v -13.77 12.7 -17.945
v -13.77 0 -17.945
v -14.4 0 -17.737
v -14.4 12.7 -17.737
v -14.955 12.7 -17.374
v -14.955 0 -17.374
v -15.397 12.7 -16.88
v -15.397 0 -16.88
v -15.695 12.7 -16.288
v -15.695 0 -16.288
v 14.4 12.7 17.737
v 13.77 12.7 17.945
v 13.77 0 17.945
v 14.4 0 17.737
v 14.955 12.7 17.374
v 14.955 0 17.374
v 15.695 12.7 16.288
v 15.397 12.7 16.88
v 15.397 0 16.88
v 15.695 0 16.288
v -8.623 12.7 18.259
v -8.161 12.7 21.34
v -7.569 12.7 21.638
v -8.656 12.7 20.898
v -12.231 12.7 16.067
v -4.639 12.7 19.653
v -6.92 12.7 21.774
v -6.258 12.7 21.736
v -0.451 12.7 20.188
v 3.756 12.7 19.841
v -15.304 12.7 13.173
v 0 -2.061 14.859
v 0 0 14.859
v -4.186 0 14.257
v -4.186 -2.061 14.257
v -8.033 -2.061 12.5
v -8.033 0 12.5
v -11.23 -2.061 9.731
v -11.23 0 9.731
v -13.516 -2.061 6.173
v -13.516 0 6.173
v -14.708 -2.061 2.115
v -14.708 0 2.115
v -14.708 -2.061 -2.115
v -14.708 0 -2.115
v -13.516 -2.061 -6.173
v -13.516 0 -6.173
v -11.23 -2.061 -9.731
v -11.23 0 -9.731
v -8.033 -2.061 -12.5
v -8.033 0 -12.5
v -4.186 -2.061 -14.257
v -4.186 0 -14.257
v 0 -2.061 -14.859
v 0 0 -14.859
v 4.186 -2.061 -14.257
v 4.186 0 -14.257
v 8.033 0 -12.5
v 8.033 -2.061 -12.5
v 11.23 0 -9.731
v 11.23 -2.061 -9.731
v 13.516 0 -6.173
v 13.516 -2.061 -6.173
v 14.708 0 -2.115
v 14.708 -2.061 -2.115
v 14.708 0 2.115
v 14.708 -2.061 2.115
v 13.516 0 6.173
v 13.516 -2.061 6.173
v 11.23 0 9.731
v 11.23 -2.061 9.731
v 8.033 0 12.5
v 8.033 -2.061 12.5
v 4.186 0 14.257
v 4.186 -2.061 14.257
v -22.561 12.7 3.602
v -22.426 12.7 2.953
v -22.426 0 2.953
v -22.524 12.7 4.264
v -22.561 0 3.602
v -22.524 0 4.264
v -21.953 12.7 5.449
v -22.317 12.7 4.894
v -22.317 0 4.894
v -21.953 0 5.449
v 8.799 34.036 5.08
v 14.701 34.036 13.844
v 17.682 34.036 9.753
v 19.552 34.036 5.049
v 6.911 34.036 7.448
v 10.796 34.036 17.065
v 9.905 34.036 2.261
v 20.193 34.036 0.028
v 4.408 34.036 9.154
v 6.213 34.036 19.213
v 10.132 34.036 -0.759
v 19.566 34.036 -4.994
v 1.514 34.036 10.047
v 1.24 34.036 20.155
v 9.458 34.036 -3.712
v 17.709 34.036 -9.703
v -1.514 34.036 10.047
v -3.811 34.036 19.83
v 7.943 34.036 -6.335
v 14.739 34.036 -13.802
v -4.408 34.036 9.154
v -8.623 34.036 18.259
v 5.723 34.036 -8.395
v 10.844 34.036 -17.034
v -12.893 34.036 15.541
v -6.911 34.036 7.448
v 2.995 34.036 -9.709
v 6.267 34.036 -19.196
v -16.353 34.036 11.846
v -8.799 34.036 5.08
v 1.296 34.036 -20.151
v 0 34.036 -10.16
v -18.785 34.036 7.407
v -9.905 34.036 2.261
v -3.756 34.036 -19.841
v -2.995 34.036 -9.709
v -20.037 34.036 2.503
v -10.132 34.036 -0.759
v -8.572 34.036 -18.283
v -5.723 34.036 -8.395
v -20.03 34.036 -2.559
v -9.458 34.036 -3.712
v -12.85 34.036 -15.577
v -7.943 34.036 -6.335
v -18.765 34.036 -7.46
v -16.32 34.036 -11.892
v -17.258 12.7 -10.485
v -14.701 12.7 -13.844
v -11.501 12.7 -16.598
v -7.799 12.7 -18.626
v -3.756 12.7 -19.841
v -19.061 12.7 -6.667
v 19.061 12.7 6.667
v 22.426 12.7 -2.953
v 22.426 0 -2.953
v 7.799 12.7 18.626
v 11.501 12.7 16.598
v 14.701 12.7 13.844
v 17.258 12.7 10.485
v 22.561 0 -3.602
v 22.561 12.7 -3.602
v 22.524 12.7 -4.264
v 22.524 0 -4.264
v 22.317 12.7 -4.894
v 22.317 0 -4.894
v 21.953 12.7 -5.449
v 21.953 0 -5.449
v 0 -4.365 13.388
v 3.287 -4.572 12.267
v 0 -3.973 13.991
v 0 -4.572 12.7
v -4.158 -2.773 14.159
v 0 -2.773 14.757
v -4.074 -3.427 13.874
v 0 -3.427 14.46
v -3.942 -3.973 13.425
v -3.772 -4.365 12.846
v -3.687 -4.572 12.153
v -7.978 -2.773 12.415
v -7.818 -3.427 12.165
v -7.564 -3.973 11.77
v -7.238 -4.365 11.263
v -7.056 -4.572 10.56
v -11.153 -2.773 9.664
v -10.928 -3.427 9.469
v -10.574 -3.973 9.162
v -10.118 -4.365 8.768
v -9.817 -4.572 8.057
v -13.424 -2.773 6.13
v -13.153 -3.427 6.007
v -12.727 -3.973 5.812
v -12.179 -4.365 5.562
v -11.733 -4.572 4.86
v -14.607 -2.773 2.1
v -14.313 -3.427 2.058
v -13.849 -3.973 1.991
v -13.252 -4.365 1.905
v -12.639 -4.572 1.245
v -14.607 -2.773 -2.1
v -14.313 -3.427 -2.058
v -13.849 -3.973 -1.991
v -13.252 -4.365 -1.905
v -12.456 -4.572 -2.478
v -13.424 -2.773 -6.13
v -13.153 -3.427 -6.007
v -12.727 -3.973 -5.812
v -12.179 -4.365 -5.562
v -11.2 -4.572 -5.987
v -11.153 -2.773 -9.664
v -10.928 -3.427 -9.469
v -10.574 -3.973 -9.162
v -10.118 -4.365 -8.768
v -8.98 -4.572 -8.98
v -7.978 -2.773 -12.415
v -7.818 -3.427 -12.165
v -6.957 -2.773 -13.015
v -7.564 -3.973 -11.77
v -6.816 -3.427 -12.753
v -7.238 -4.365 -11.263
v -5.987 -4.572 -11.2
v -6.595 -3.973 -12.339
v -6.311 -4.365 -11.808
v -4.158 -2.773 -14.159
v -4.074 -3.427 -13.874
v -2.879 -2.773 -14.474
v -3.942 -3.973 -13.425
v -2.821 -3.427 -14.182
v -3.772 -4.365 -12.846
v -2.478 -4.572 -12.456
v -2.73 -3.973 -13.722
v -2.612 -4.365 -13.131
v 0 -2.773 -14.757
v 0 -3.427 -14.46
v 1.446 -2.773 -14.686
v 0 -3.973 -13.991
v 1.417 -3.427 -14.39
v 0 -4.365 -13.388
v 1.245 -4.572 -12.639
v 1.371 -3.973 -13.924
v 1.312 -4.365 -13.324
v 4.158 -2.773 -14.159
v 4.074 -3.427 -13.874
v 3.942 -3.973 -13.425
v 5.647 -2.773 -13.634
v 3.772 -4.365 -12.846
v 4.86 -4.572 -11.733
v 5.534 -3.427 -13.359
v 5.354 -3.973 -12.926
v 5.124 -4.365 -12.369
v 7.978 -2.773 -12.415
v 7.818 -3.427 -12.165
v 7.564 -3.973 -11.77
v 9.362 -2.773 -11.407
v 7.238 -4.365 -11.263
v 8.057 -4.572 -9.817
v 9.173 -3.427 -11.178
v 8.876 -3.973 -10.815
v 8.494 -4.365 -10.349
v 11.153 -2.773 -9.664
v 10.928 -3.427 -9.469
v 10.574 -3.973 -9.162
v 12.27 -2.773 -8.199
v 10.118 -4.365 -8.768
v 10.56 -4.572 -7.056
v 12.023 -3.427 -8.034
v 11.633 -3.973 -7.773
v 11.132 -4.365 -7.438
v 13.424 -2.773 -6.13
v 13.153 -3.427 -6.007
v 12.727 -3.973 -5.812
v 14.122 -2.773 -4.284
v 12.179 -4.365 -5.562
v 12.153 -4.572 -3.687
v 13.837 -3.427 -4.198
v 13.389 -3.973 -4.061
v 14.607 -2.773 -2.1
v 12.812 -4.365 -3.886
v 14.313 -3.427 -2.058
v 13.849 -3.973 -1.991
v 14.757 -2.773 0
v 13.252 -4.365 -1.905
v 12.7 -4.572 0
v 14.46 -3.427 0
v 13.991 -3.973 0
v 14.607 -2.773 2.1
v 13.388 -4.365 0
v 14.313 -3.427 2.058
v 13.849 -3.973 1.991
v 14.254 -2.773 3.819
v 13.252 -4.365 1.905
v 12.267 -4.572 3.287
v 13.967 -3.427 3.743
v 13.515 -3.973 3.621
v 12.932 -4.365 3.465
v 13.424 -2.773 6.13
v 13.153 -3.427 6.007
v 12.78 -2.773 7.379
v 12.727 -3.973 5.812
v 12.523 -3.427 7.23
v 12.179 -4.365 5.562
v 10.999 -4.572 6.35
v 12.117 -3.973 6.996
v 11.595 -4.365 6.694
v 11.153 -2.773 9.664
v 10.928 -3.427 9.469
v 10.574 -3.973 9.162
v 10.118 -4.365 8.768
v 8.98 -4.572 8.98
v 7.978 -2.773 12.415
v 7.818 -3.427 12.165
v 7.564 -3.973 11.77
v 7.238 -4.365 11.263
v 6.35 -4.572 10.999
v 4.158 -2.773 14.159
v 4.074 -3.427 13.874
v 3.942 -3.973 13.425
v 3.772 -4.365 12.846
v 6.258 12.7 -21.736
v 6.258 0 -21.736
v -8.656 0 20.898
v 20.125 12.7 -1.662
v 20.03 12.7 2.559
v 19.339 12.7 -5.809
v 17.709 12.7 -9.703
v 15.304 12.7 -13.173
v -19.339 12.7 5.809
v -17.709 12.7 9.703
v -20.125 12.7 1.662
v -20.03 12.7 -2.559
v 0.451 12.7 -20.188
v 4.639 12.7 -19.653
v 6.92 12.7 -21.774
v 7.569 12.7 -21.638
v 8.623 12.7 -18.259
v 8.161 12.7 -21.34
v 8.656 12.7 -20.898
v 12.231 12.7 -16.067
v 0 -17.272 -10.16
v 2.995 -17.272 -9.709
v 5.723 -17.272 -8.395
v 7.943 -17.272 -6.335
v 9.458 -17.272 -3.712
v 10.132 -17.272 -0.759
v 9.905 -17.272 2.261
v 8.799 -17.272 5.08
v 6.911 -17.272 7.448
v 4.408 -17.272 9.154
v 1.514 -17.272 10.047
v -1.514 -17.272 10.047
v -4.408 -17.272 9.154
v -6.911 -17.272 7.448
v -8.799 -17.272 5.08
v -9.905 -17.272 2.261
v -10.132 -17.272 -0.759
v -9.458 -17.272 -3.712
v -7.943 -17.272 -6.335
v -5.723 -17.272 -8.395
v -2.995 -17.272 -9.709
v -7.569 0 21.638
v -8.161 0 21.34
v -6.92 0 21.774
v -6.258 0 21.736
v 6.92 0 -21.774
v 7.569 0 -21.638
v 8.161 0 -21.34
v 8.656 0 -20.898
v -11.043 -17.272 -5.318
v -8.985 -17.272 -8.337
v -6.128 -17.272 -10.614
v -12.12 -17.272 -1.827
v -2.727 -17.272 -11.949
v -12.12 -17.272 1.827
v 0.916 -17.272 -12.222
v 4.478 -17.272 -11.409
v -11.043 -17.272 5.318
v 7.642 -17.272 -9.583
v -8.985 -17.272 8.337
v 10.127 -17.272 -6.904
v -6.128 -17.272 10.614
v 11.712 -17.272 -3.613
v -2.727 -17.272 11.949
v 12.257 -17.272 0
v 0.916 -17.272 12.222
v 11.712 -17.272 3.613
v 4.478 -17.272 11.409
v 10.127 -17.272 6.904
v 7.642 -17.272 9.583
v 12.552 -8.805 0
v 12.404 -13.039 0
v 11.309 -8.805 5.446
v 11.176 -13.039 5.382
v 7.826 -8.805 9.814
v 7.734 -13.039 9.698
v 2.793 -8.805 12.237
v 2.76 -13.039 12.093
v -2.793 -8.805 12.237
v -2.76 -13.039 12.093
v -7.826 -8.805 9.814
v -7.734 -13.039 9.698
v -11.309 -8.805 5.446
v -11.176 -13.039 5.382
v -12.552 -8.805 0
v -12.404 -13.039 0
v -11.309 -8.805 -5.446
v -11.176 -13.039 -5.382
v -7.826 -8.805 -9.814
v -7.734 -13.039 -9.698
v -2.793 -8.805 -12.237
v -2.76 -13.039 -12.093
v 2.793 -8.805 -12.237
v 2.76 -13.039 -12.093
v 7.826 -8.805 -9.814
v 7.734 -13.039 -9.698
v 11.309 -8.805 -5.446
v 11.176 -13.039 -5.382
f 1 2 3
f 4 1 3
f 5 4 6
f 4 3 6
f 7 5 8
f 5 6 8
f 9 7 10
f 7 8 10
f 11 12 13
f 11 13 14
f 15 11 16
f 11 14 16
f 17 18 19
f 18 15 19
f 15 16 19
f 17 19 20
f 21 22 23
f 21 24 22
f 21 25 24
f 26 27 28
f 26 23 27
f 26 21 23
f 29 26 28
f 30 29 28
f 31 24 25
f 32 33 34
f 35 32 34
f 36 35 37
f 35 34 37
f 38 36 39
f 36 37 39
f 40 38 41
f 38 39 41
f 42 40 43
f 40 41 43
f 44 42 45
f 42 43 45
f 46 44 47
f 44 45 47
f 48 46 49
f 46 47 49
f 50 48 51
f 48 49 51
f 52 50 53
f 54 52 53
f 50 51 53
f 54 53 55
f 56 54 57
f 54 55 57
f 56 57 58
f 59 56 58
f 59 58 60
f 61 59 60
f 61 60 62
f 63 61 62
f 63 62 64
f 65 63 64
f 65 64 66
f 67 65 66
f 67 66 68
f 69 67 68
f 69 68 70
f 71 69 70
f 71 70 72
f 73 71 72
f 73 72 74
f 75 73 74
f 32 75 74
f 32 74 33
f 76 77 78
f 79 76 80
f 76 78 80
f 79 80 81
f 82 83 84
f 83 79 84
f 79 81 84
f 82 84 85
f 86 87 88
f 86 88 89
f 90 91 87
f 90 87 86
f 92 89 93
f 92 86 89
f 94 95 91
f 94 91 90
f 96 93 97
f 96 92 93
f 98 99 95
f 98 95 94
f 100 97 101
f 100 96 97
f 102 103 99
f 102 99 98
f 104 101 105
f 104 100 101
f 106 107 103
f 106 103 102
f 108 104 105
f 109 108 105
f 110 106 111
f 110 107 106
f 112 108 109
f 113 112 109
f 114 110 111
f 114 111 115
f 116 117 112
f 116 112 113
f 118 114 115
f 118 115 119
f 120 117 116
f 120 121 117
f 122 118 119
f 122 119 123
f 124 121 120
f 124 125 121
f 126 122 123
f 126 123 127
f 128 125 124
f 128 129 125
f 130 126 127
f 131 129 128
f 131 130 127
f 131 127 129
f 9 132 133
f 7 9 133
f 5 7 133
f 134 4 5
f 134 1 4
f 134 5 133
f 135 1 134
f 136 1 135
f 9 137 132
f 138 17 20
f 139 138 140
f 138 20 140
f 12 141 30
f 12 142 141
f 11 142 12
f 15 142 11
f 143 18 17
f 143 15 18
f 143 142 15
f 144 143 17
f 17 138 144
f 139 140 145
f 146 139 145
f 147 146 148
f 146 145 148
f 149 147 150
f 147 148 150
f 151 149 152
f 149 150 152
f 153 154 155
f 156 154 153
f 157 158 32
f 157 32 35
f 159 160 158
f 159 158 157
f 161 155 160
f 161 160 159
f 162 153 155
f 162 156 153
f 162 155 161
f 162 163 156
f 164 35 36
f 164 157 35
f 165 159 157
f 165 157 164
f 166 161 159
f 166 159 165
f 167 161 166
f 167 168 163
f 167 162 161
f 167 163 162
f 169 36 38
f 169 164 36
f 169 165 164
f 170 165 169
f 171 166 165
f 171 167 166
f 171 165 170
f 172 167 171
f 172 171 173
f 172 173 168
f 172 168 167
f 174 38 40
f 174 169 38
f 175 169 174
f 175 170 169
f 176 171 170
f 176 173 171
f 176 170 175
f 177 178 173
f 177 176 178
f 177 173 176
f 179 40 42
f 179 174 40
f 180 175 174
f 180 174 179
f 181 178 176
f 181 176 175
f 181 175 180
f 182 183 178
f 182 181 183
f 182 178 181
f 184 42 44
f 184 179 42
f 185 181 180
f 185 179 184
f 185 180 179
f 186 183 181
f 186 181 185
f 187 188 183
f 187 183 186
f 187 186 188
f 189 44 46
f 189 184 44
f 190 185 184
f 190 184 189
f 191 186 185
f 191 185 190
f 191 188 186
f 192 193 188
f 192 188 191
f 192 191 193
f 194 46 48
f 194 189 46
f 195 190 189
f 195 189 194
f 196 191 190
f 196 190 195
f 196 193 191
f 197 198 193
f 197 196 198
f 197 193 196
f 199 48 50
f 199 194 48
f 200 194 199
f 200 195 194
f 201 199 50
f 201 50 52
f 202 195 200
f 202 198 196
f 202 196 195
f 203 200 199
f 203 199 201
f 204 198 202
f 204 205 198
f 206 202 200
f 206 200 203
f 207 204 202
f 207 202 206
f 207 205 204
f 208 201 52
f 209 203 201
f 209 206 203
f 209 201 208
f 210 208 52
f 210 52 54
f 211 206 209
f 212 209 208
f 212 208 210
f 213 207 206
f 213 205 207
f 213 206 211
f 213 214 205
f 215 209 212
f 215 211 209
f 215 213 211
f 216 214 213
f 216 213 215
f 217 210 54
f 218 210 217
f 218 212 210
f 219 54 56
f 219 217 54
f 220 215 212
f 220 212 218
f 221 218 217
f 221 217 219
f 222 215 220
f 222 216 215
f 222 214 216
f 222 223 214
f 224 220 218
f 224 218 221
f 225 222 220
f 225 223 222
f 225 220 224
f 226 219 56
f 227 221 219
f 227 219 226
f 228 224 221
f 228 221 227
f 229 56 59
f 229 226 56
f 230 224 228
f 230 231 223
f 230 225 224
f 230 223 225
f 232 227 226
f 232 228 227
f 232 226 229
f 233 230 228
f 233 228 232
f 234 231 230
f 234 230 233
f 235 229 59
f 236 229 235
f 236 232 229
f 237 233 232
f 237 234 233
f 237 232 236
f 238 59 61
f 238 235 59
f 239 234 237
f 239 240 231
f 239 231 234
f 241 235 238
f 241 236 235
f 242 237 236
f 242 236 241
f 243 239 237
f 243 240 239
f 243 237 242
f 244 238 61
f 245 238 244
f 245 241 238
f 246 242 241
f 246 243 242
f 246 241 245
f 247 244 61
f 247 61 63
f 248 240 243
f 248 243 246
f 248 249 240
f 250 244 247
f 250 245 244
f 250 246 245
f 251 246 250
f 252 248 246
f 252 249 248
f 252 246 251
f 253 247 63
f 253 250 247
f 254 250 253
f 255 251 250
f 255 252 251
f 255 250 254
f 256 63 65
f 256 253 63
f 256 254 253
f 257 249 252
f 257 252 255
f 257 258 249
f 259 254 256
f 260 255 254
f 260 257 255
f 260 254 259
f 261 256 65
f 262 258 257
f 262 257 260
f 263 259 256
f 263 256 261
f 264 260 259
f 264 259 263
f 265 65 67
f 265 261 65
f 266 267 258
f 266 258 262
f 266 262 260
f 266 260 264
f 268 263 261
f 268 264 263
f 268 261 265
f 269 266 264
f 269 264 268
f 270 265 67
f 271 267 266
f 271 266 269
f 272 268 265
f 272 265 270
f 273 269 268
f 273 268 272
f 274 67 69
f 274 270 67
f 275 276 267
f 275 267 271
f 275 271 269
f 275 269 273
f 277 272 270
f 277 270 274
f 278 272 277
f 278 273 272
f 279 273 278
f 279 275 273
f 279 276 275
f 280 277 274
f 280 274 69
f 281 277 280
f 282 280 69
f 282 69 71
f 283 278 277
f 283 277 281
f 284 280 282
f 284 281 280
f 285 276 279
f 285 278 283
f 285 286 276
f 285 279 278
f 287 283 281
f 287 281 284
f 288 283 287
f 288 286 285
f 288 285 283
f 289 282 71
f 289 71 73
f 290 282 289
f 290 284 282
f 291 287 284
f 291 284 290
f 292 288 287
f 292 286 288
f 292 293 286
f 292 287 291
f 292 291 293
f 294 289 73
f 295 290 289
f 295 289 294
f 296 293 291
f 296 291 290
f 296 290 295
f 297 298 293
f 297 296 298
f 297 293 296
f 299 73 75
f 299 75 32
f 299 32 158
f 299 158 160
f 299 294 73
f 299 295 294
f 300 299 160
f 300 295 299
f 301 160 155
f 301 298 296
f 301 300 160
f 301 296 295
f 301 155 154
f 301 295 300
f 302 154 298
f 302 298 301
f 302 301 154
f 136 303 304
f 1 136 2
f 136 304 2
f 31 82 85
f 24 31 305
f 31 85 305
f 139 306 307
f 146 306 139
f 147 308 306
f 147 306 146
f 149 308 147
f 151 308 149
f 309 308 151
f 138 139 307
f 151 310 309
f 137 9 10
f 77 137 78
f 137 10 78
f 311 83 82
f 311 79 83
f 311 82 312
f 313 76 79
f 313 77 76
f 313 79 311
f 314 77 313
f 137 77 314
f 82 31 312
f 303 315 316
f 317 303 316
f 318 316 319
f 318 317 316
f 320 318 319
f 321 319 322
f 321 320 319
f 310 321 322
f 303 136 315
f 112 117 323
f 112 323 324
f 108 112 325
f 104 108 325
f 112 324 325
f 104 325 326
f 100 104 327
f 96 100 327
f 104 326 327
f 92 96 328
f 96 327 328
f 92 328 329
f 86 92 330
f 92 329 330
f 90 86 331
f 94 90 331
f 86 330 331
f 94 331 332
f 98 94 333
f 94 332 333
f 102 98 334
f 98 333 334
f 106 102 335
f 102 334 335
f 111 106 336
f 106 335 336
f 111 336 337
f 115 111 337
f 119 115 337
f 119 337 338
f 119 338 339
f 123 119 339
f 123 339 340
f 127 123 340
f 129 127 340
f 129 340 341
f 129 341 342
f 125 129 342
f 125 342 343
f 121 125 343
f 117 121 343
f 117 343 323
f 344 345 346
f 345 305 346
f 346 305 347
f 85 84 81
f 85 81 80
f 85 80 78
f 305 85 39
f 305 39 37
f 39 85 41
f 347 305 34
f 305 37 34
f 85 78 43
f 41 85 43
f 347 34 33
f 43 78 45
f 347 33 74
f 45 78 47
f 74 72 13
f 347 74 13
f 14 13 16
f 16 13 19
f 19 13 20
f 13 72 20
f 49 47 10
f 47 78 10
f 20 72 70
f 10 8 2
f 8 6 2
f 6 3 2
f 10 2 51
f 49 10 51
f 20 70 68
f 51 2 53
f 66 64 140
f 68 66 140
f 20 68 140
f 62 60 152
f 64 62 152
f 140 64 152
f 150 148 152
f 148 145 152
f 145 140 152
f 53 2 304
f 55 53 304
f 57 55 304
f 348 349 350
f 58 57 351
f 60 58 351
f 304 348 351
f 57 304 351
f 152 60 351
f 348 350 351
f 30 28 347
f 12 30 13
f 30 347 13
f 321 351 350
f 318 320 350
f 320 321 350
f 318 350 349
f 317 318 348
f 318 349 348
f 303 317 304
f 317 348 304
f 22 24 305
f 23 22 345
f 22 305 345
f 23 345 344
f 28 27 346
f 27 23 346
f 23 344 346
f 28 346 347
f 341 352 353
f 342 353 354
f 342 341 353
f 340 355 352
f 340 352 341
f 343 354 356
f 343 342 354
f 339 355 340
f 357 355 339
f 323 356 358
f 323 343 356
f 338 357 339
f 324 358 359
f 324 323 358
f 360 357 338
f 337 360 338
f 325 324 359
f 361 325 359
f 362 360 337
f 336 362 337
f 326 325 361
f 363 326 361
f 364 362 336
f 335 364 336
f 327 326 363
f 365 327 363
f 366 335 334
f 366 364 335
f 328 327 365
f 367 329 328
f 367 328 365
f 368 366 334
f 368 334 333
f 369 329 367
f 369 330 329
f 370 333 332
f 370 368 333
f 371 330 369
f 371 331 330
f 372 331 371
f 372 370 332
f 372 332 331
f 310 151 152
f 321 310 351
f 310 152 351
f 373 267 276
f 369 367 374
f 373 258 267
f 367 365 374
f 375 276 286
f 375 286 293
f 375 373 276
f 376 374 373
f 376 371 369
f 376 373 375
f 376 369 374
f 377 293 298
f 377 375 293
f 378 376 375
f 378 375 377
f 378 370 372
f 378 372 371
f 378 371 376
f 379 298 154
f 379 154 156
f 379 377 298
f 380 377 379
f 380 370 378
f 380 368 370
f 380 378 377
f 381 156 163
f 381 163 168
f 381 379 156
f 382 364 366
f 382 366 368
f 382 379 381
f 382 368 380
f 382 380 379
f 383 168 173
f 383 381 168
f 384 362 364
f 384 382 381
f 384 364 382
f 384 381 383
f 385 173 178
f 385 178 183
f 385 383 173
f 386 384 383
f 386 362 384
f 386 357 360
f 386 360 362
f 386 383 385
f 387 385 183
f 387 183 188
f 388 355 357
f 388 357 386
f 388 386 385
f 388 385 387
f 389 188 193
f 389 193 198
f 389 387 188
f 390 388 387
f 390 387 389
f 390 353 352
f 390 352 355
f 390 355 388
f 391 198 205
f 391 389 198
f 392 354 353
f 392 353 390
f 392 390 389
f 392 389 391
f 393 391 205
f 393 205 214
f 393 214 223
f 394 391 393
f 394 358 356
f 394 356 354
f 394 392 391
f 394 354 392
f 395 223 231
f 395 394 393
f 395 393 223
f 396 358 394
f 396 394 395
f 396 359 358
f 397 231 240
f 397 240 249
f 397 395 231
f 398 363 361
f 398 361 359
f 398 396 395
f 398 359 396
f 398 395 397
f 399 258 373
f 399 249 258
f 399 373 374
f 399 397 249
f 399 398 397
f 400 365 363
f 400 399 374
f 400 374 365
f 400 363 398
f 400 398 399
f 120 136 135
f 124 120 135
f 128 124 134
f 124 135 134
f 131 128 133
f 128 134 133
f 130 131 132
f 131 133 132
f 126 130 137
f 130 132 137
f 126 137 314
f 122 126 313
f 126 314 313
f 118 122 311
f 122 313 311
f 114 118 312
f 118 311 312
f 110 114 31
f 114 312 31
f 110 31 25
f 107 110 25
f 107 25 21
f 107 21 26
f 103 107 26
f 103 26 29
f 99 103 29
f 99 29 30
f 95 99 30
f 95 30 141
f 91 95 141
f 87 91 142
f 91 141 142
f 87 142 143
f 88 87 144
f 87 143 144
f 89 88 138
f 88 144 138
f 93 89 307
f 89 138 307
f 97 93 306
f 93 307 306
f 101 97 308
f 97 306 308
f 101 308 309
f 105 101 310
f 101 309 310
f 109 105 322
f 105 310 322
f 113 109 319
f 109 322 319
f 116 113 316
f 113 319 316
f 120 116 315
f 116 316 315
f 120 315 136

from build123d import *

# Parameters (mm, degrees)
BOSS_EXTRUDE1_DEPTH = 12.7
SKETCH2_R           = 20.193
BOSS_EXTRUDE2_DEPTH = 21.336
SKETCH3_R           = 14.859
BOSS_EXTRUDE3_DEPTH = 4.572
SKETCH4_R           = 12.7
BOSS_EXTRUDE4_DEPTH = 12.7
BOSS_EXTRUDE4_TAPER = 2
SKETCH5_R           = 10.16
CUT_EXTRUDE1_DEPTH  = 61.347161428
FILLET1_R           = 2.54


with BuildPart() as part:
    # Sketch1 → Boss-Extrude1 (new body)
    with BuildSketch(Plane(origin=(0, 0, 0), x_dir=(1, 0, 0), z_dir=(0, 1, 0))):
        Polygon((15.211069479, -17.672003206), (22.909938452, 4.337170984), (7.698868973, 22.00917419), (-15.211069479, 17.672003206), (-22.909938452, -4.337170984), (-7.698868973, -22.00917419), align=None)
    extrude(amount=BOSS_EXTRUDE1_DEPTH)

    # Sketch2 → Boss-Extrude2 (add)
    with BuildSketch(Plane(origin=(0, 12.7, 0), x_dir=(1, 0, 0), z_dir=(0, 1, 0))):
        with Locations(Location((0, 0, 0), (0, 0, 100.720024221))):
            Circle(SKETCH2_R)
    extrude(amount=BOSS_EXTRUDE2_DEPTH)

    # Sketch3 → Boss-Extrude3 (add)
    with BuildSketch(Plane.XZ):
        with Locations(Location((0, 0, 0), (0, 0, 90))):
            Circle(SKETCH3_R)
    extrude(amount=BOSS_EXTRUDE3_DEPTH)

    # Sketch4 → Boss-Extrude4 (add)
    with BuildSketch(Plane.XZ.offset(4.572)):
        Circle(SKETCH4_R)
    extrude(amount=BOSS_EXTRUDE4_DEPTH, taper=BOSS_EXTRUDE4_TAPER)

    # Sketch5 → Cut-Extrude1 (cut, through all)
    with BuildSketch(Plane.XZ.offset(17.272)):
        with Locations(Location((0, 0, 0), (0, 0, 270))):
            Circle(SKETCH5_R)
    extrude(amount=-CUT_EXTRUDE1_DEPTH, mode=Mode.SUBTRACT)

    # Fillet1
    # the kernel refuses this fillet: 2.54 mm, written as the material it takes off along each edge
    with BuildSketch(Plane(origin=(-7.698868973, -3.666174209, 22.00917419), x_dir=(0.9825478481724581, 0, -0.18601001599825806), z_dir=(0, 1, 0)), Plane(origin=(-22.909938452, -3.666174209, 4.337170984), x_dir=(0.6523633232990701, 0, 0.7579063889519556), z_dir=(0, 1, 0)), Plane(origin=(15.211069479, -3.666174209, 17.672003206), x_dir=(0.3301845248733872, 0, -0.9439164049502137), z_dir=(0, 1, 0))) as fillet1_piece_1:
        with BuildLine():
            CenterArc((FILLET1_R * 0.57735026919, FILLET1_R), FILLET1_R, 210, 60)
            Line((-FILLET1_R * 0.288675134595, FILLET1_R * 0.5), (-FILLET1_R * 0.305995642671, FILLET1_R * 0.49))
            Line((-FILLET1_R * 0.305995642671, FILLET1_R * 0.49), (-FILLET1_R * 0.0115470053838, -FILLET1_R * 0.02))
            Line((-FILLET1_R * 0.0115470053838, -FILLET1_R * 0.02), (FILLET1_R * 0.57735026919, -FILLET1_R * 0.02))
            Line((FILLET1_R * 0.57735026919, -FILLET1_R * 0.02), (FILLET1_R * 0.57735026919, 0))
        make_face()
    extrude(amount=20.032348419, mode=Mode.SUBTRACT)
    with BuildSketch(Plane(origin=(-15.211069479, -3.666174209, -17.672003206), x_dir=(0.9825478481724584, 0, -0.18601001599825617), z_dir=(0, 1, 0)), Plane(origin=(7.698868973, -3.666174209, -22.00917419), x_dir=(0.6523633232990698, 0, 0.7579063889519558), z_dir=(0, 1, 0)), Plane(origin=(22.909938452, -3.666174209, -4.337170984), x_dir=(-0.33018452487338784, 0, 0.9439164049502133), z_dir=(0, 1, 0))) as fillet1_piece_2:
        with BuildLine():
            CenterArc((FILLET1_R * 0.57735026919, -FILLET1_R), FILLET1_R, 90, 60)
            Line((-FILLET1_R * 0.288675134595, -FILLET1_R * 0.5), (-FILLET1_R * 0.305995642671, -FILLET1_R * 0.49))
            Line((-FILLET1_R * 0.305995642671, -FILLET1_R * 0.49), (-FILLET1_R * 0.0115470053838, FILLET1_R * 0.02))
            Line((-FILLET1_R * 0.0115470053838, FILLET1_R * 0.02), (FILLET1_R * 0.57735026919, FILLET1_R * 0.02))
            Line((FILLET1_R * 0.57735026919, FILLET1_R * 0.02), (FILLET1_R * 0.57735026919, 0))
        make_face()
    extrude(amount=20.032348419, mode=Mode.SUBTRACT)
    with BuildSketch(Plane(origin=(0, -4.572, 0), x_dir=(0, 0, 1), z_dir=(1, 0, 0))) as fillet1_piece_3:
        with BuildLine():
            CenterArc((12.319, -2.511262432), FILLET1_R, 0, 81.373073441)
            Line((12.7, 0), (12.70762, 0.050225249))
            ThreePointArc((12.70762, 0.050225249), (13.7795, 0.0508), (14.859, 0.0508))
            Line((14.859, 0.0508), (14.9098, 0))
            Line((14.9098, 0), (14.9098, -2.511262432))
            Line((14.9098, -2.511262432), (14.859, -2.511262432))
        make_face()
    revolve(axis=Axis((0, -4.572, 0), (0, -1, 0)), mode=Mode.SUBTRACT)


solid = part.part
